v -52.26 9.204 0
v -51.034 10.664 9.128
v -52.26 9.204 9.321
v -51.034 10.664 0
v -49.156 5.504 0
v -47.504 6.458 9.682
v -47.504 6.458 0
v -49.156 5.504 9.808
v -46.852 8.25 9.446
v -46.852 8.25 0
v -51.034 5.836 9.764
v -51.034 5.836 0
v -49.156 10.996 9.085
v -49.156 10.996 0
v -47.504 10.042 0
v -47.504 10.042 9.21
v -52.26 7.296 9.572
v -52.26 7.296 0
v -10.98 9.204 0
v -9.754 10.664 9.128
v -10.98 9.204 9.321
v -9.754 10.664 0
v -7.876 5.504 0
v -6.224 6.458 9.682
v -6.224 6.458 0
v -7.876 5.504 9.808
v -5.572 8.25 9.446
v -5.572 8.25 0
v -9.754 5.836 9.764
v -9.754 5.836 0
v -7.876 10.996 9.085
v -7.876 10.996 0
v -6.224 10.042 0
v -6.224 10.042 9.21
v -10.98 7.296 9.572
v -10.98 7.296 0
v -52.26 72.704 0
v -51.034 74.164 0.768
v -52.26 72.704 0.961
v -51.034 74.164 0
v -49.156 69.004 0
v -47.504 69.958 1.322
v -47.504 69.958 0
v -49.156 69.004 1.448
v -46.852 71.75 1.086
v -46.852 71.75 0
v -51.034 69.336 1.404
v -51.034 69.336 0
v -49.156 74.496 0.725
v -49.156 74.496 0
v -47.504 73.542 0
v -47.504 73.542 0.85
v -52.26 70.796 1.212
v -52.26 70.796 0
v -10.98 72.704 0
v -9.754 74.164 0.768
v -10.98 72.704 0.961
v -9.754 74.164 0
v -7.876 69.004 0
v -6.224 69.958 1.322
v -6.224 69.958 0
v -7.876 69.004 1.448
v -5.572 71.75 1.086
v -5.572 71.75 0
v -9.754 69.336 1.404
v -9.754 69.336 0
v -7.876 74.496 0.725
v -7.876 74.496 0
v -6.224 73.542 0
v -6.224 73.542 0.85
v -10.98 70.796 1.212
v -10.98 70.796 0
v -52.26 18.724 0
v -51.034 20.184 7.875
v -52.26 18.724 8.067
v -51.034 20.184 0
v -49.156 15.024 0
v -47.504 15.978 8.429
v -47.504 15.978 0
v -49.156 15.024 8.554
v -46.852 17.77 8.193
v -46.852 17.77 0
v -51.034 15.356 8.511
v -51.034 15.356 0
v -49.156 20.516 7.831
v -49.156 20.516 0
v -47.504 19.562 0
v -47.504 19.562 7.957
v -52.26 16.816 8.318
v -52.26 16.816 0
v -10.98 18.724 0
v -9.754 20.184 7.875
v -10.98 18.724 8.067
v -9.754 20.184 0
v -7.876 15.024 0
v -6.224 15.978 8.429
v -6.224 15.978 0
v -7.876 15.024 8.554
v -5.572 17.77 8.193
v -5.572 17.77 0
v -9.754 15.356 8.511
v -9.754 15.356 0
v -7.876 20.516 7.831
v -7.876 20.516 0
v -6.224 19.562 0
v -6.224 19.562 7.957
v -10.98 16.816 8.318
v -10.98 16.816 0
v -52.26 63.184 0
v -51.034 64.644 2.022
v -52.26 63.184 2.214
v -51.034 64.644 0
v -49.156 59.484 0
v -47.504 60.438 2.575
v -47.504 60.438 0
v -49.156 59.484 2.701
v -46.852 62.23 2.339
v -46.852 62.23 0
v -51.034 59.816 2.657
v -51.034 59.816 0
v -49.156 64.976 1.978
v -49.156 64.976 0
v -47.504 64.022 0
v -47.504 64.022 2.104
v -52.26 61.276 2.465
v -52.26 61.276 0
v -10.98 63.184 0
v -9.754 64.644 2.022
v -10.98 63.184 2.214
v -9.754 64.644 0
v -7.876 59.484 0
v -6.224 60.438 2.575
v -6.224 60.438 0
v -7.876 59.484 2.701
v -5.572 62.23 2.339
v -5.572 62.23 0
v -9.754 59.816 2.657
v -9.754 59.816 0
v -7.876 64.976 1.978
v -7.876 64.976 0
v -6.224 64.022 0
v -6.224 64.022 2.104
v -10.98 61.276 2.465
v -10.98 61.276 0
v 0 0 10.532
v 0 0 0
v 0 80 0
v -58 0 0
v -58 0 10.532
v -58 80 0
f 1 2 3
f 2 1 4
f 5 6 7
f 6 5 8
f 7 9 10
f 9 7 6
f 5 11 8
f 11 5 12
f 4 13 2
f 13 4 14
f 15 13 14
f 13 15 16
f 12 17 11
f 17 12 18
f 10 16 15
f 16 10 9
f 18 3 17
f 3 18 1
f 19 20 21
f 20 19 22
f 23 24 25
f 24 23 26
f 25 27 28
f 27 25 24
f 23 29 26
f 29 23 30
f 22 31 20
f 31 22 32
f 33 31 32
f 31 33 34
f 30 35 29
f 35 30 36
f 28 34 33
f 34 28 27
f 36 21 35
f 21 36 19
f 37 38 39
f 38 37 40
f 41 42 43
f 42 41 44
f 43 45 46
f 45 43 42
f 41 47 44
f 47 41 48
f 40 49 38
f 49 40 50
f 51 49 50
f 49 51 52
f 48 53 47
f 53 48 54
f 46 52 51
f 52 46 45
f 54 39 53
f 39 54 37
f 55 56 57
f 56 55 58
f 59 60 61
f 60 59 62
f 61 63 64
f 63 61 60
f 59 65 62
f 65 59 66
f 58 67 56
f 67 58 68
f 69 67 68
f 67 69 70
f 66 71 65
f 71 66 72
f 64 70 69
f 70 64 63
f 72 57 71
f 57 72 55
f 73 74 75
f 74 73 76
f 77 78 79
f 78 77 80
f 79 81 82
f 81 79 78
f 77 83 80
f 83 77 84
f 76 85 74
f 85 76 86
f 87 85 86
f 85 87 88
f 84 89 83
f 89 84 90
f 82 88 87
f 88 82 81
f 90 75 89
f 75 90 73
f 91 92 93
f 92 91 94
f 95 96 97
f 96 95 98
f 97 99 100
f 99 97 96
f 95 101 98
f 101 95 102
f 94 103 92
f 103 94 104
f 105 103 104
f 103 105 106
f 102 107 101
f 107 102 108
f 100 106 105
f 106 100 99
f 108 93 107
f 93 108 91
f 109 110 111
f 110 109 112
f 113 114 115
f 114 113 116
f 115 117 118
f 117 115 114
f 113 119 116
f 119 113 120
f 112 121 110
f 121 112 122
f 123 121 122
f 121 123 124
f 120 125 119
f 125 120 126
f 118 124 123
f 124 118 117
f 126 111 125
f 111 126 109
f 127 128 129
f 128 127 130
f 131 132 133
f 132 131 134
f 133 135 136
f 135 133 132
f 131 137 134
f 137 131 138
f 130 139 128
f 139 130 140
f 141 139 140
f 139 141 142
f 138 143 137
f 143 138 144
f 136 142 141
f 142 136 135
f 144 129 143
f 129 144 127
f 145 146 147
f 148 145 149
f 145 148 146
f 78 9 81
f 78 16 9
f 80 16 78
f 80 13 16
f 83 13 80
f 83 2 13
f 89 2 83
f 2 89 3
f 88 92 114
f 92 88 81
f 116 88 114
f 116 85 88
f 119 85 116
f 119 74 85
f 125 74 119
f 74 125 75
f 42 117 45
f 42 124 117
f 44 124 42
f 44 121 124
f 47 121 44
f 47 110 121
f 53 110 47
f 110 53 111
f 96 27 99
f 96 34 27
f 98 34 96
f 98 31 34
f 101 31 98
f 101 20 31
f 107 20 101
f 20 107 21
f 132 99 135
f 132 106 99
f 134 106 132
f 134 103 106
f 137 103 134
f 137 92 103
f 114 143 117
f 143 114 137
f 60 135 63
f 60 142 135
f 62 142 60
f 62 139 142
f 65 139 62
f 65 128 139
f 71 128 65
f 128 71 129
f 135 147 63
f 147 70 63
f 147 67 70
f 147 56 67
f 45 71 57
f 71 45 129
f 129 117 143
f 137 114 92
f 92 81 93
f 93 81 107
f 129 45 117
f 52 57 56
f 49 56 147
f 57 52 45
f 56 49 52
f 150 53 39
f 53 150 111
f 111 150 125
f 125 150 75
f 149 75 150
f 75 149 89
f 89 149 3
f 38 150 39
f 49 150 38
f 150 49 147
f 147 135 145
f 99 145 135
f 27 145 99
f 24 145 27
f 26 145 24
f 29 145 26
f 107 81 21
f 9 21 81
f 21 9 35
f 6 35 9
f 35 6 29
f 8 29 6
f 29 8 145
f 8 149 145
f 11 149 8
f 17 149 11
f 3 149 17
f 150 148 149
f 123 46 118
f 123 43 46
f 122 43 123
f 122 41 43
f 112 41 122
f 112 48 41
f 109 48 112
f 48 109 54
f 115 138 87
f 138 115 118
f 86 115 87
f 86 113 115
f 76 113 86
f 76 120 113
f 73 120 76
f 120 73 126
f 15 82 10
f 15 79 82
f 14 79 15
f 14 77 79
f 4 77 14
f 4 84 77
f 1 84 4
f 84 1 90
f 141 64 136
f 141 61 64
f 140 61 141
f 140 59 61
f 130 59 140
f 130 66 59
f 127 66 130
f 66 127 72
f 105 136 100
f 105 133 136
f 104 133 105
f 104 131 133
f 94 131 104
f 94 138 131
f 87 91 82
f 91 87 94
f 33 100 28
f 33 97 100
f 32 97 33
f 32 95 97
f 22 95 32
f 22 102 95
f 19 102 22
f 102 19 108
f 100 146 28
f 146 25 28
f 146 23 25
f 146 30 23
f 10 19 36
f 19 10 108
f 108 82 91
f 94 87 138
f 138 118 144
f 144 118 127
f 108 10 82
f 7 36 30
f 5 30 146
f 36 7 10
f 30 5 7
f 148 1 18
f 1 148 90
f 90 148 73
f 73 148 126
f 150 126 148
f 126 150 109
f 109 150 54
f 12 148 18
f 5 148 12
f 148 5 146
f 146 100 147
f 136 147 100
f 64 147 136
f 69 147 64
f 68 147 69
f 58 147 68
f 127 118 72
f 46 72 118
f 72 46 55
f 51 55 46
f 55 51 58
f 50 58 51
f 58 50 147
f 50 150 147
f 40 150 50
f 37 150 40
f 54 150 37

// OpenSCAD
// This makes the holes bigger.
tolerance = .3;
// This determines how thick the base of the riser will be in mm.
rise = 0; // [0:100]
// This Determines the angle of the wedge, between 0 and 45 degrees. Dont forget you can stack these too!
angle = 7.5; // [0:45]

// Copyright 2010 D1plo1d

// This library is dual licensed under the GPL 3.0 and the GNU Lesser General Public License as per http://creativecommons.org/licenses/LGPL/2.1/ .

//testNutsAndBolts();

module SKIPtestNutsAndBolts()
{
	$fn = 360;
	translate([0,15])nutHole(3, proj=2);
	boltHole(3, length= 30, proj=2);
}

MM = "mm";
INCH = "inch"; //Not yet supported

//Based on: http://www.roymech.co.uk/Useful_Tables/Screws/Hex_Screws.htm
METRIC_NUT_AC_WIDTHS =
[
	-1, //0 index is not used but reduces computation
	-1,
	-1,
	6.40,//m3
	8.10,//m4
	9.20,//m5
	11.50,//m6
	-1,
	15.00,//m8
	-1,
	19.60,//m10
	-1,
	22.10,//m12
	-1,
	-1,
	-1,
	27.70,//m16
	-1,
	-1,
	-1,
	34.60,//m20
	-1,
	-1,
	-1,
	41.60,//m24
	-1,
	-1,
	-1,
	-1,
	-1,
	53.1,//m30
	-1,
	-1,
	-1,
	-1,
	-1,
	63.5//m36
];
METRIC_NUT_THICKNESS =
[
	-1, //0 index is not used but reduces computation
	-1,
	-1,
	2.40,//m3
	3.20,//m4
	4.00,//m5
	5.00,//m6
	-1,
	6.50,//m8
	-1,
	8.00,//m10
	-1,
	10.00,//m12
	-1,
	-1,
	-1,
	13.00,//m16
	-1,
	-1,
	-1,
	16.00//m20
	-1,
	-1,
	-1,
	19.00,//m24
	-1,
	-1,
	-1,
	-1,
	-1,
	24.00,//m30
	-1,
	-1,
	-1,
	-1,
	-1,
	29.00//m36
];

COURSE_METRIC_BOLT_MAJOR_THREAD_DIAMETERS =
[//based on max values
	-1, //0 index is not used but reduces computation
	-1,
	-1,
	2.98,//m3
	3.978,//m4
	4.976,//m5
	5.974,//m6
	-1,
	7.972,//m8
	-1,
	9.968,//m10
	-1,
	11.966,//m12
	-1,
	-1,
	-1,
	15.962,//m16
	-1,
	-1,
	-1,
	19.958,//m20
	-1,
	-1,
	-1,
	23.952,//m24
	-1,
	-1,
	-1,
	-1,
	-1,
	29.947,//m30
	-1,
	-1,
	-1,
	-1,
	-1,
	35.940//m36
];

module nutHole(size, units=MM, tolerance = +0.0001, proj = -1)
{
	//takes a metric screw/nut size and looksup nut dimensions
	radius = METRIC_NUT_AC_WIDTHS[size]/2+tolerance;
	height = METRIC_NUT_THICKNESS[size]+tolerance;
	if (proj == -1)
	{
		cylinder(r= radius, h=height, $fn = 6, center=[0,0]);
	}
	if (proj == 1)
	{
		circle(r= radius, $fn = 6);
	}
	if (proj == 2)
	{
		translate([-radius/2, 0])
			square([radius*2, height]);
	}
}

module boltHole(size, units=MM, length, tolerance = +0.0001, proj = -1)
{
	radius = COURSE_METRIC_BOLT_MAJOR_THREAD_DIAMETERS[size]/2+tolerance;
//TODO: proper screw cap values
	capHeight = METRIC_NUT_THICKNESS[size]+tolerance; //METRIC_BOLT_CAP_HEIGHTS[size]+tolerance;
	capRadius = METRIC_NUT_AC_WIDTHS[size]/2+tolerance; //METRIC_BOLT_CAP_RADIUS[size]+tolerance;

	if (proj == -1)
	{
	translate([0, 0, -capHeight])
		cylinder(r= capRadius, h=capHeight);
	cylinder(r = radius, h = length);
	}
	if (proj == 1)
	{
		circle(r = radius);
	}
	if (proj == 2)
	{
		translate([-capRadius/2, -capHeight])
			square([capRadius*2, capHeight]);
		square([radius*2, length]);
	}
}



/* length, width of wedge
    height of side 1 and 2 
    drill oldschool and/or newschool pattern 
    bolt size (M)

    NOTE: if both oldschool and newschool bits are set to 1, 
    the newschool pattern will be displaced to match on one side.
*/
module wedge(len, wid, hei1, hei2, oldschool, newschool, bolt, angle1, derpschool) {

len = 80;
bolt_wid = 41.28;
new_len = 53.98;
old_len = 63.5;
angle1 = angle;
hei1 = tan(angle1)*len+rise;
hei2 = rise;

mx = len/2;
my = wid/2;

difference() {
  rotate([0,-90,0])
  linear_extrude(height=wid)
    polygon (points = [[0,0],[0,len],[hei2,len],[hei1,0]]);


/* for sunken holes you'll never need, 
   translate z by 
                     hei1 + (hei2-hei1)/len * (mx + x*mx*3/4) -0.5
*/

if (oldschool==1) {
  for (x = [-1,1])
  for (y = [-1,1]) 
  translate([-my + y * bolt_wid/2, mx + x * old_len/2, hei1+hei2 ])
  rotate([180,0,0])
  boltHole(bolt, length=hei1+hei2+0.1, tolerance=tolerance, 2);
}

if (newschool==1) {
  for (x = [-1,1])
  for (y = [-1,1]) 
  translate([-my + y * bolt_wid/2, mx + x * new_len/2 +(old_len-new_len)/2 * oldschool, hei1+hei2])
  rotate([180,0,0])
  boltHole(bolt, length=hei1+hei2+0.1, tolerance=tolerance, 2);
}
if (newschool==1) {
  for (x = [-1,1])
  for (y = [-1,1]) 
  translate([-my + y * bolt_wid/2, mx + x * new_len/2 -(old_len-new_len)/2 * oldschool, hei1+hei2])
  rotate([180,0,0])
  boltHole(bolt, length=hei1+hei2+0.1, tolerance=tolerance, 2);
}
}
}

/* example */
wedge (90, 58, 15, 10, 1, 1, 5);
/**/
